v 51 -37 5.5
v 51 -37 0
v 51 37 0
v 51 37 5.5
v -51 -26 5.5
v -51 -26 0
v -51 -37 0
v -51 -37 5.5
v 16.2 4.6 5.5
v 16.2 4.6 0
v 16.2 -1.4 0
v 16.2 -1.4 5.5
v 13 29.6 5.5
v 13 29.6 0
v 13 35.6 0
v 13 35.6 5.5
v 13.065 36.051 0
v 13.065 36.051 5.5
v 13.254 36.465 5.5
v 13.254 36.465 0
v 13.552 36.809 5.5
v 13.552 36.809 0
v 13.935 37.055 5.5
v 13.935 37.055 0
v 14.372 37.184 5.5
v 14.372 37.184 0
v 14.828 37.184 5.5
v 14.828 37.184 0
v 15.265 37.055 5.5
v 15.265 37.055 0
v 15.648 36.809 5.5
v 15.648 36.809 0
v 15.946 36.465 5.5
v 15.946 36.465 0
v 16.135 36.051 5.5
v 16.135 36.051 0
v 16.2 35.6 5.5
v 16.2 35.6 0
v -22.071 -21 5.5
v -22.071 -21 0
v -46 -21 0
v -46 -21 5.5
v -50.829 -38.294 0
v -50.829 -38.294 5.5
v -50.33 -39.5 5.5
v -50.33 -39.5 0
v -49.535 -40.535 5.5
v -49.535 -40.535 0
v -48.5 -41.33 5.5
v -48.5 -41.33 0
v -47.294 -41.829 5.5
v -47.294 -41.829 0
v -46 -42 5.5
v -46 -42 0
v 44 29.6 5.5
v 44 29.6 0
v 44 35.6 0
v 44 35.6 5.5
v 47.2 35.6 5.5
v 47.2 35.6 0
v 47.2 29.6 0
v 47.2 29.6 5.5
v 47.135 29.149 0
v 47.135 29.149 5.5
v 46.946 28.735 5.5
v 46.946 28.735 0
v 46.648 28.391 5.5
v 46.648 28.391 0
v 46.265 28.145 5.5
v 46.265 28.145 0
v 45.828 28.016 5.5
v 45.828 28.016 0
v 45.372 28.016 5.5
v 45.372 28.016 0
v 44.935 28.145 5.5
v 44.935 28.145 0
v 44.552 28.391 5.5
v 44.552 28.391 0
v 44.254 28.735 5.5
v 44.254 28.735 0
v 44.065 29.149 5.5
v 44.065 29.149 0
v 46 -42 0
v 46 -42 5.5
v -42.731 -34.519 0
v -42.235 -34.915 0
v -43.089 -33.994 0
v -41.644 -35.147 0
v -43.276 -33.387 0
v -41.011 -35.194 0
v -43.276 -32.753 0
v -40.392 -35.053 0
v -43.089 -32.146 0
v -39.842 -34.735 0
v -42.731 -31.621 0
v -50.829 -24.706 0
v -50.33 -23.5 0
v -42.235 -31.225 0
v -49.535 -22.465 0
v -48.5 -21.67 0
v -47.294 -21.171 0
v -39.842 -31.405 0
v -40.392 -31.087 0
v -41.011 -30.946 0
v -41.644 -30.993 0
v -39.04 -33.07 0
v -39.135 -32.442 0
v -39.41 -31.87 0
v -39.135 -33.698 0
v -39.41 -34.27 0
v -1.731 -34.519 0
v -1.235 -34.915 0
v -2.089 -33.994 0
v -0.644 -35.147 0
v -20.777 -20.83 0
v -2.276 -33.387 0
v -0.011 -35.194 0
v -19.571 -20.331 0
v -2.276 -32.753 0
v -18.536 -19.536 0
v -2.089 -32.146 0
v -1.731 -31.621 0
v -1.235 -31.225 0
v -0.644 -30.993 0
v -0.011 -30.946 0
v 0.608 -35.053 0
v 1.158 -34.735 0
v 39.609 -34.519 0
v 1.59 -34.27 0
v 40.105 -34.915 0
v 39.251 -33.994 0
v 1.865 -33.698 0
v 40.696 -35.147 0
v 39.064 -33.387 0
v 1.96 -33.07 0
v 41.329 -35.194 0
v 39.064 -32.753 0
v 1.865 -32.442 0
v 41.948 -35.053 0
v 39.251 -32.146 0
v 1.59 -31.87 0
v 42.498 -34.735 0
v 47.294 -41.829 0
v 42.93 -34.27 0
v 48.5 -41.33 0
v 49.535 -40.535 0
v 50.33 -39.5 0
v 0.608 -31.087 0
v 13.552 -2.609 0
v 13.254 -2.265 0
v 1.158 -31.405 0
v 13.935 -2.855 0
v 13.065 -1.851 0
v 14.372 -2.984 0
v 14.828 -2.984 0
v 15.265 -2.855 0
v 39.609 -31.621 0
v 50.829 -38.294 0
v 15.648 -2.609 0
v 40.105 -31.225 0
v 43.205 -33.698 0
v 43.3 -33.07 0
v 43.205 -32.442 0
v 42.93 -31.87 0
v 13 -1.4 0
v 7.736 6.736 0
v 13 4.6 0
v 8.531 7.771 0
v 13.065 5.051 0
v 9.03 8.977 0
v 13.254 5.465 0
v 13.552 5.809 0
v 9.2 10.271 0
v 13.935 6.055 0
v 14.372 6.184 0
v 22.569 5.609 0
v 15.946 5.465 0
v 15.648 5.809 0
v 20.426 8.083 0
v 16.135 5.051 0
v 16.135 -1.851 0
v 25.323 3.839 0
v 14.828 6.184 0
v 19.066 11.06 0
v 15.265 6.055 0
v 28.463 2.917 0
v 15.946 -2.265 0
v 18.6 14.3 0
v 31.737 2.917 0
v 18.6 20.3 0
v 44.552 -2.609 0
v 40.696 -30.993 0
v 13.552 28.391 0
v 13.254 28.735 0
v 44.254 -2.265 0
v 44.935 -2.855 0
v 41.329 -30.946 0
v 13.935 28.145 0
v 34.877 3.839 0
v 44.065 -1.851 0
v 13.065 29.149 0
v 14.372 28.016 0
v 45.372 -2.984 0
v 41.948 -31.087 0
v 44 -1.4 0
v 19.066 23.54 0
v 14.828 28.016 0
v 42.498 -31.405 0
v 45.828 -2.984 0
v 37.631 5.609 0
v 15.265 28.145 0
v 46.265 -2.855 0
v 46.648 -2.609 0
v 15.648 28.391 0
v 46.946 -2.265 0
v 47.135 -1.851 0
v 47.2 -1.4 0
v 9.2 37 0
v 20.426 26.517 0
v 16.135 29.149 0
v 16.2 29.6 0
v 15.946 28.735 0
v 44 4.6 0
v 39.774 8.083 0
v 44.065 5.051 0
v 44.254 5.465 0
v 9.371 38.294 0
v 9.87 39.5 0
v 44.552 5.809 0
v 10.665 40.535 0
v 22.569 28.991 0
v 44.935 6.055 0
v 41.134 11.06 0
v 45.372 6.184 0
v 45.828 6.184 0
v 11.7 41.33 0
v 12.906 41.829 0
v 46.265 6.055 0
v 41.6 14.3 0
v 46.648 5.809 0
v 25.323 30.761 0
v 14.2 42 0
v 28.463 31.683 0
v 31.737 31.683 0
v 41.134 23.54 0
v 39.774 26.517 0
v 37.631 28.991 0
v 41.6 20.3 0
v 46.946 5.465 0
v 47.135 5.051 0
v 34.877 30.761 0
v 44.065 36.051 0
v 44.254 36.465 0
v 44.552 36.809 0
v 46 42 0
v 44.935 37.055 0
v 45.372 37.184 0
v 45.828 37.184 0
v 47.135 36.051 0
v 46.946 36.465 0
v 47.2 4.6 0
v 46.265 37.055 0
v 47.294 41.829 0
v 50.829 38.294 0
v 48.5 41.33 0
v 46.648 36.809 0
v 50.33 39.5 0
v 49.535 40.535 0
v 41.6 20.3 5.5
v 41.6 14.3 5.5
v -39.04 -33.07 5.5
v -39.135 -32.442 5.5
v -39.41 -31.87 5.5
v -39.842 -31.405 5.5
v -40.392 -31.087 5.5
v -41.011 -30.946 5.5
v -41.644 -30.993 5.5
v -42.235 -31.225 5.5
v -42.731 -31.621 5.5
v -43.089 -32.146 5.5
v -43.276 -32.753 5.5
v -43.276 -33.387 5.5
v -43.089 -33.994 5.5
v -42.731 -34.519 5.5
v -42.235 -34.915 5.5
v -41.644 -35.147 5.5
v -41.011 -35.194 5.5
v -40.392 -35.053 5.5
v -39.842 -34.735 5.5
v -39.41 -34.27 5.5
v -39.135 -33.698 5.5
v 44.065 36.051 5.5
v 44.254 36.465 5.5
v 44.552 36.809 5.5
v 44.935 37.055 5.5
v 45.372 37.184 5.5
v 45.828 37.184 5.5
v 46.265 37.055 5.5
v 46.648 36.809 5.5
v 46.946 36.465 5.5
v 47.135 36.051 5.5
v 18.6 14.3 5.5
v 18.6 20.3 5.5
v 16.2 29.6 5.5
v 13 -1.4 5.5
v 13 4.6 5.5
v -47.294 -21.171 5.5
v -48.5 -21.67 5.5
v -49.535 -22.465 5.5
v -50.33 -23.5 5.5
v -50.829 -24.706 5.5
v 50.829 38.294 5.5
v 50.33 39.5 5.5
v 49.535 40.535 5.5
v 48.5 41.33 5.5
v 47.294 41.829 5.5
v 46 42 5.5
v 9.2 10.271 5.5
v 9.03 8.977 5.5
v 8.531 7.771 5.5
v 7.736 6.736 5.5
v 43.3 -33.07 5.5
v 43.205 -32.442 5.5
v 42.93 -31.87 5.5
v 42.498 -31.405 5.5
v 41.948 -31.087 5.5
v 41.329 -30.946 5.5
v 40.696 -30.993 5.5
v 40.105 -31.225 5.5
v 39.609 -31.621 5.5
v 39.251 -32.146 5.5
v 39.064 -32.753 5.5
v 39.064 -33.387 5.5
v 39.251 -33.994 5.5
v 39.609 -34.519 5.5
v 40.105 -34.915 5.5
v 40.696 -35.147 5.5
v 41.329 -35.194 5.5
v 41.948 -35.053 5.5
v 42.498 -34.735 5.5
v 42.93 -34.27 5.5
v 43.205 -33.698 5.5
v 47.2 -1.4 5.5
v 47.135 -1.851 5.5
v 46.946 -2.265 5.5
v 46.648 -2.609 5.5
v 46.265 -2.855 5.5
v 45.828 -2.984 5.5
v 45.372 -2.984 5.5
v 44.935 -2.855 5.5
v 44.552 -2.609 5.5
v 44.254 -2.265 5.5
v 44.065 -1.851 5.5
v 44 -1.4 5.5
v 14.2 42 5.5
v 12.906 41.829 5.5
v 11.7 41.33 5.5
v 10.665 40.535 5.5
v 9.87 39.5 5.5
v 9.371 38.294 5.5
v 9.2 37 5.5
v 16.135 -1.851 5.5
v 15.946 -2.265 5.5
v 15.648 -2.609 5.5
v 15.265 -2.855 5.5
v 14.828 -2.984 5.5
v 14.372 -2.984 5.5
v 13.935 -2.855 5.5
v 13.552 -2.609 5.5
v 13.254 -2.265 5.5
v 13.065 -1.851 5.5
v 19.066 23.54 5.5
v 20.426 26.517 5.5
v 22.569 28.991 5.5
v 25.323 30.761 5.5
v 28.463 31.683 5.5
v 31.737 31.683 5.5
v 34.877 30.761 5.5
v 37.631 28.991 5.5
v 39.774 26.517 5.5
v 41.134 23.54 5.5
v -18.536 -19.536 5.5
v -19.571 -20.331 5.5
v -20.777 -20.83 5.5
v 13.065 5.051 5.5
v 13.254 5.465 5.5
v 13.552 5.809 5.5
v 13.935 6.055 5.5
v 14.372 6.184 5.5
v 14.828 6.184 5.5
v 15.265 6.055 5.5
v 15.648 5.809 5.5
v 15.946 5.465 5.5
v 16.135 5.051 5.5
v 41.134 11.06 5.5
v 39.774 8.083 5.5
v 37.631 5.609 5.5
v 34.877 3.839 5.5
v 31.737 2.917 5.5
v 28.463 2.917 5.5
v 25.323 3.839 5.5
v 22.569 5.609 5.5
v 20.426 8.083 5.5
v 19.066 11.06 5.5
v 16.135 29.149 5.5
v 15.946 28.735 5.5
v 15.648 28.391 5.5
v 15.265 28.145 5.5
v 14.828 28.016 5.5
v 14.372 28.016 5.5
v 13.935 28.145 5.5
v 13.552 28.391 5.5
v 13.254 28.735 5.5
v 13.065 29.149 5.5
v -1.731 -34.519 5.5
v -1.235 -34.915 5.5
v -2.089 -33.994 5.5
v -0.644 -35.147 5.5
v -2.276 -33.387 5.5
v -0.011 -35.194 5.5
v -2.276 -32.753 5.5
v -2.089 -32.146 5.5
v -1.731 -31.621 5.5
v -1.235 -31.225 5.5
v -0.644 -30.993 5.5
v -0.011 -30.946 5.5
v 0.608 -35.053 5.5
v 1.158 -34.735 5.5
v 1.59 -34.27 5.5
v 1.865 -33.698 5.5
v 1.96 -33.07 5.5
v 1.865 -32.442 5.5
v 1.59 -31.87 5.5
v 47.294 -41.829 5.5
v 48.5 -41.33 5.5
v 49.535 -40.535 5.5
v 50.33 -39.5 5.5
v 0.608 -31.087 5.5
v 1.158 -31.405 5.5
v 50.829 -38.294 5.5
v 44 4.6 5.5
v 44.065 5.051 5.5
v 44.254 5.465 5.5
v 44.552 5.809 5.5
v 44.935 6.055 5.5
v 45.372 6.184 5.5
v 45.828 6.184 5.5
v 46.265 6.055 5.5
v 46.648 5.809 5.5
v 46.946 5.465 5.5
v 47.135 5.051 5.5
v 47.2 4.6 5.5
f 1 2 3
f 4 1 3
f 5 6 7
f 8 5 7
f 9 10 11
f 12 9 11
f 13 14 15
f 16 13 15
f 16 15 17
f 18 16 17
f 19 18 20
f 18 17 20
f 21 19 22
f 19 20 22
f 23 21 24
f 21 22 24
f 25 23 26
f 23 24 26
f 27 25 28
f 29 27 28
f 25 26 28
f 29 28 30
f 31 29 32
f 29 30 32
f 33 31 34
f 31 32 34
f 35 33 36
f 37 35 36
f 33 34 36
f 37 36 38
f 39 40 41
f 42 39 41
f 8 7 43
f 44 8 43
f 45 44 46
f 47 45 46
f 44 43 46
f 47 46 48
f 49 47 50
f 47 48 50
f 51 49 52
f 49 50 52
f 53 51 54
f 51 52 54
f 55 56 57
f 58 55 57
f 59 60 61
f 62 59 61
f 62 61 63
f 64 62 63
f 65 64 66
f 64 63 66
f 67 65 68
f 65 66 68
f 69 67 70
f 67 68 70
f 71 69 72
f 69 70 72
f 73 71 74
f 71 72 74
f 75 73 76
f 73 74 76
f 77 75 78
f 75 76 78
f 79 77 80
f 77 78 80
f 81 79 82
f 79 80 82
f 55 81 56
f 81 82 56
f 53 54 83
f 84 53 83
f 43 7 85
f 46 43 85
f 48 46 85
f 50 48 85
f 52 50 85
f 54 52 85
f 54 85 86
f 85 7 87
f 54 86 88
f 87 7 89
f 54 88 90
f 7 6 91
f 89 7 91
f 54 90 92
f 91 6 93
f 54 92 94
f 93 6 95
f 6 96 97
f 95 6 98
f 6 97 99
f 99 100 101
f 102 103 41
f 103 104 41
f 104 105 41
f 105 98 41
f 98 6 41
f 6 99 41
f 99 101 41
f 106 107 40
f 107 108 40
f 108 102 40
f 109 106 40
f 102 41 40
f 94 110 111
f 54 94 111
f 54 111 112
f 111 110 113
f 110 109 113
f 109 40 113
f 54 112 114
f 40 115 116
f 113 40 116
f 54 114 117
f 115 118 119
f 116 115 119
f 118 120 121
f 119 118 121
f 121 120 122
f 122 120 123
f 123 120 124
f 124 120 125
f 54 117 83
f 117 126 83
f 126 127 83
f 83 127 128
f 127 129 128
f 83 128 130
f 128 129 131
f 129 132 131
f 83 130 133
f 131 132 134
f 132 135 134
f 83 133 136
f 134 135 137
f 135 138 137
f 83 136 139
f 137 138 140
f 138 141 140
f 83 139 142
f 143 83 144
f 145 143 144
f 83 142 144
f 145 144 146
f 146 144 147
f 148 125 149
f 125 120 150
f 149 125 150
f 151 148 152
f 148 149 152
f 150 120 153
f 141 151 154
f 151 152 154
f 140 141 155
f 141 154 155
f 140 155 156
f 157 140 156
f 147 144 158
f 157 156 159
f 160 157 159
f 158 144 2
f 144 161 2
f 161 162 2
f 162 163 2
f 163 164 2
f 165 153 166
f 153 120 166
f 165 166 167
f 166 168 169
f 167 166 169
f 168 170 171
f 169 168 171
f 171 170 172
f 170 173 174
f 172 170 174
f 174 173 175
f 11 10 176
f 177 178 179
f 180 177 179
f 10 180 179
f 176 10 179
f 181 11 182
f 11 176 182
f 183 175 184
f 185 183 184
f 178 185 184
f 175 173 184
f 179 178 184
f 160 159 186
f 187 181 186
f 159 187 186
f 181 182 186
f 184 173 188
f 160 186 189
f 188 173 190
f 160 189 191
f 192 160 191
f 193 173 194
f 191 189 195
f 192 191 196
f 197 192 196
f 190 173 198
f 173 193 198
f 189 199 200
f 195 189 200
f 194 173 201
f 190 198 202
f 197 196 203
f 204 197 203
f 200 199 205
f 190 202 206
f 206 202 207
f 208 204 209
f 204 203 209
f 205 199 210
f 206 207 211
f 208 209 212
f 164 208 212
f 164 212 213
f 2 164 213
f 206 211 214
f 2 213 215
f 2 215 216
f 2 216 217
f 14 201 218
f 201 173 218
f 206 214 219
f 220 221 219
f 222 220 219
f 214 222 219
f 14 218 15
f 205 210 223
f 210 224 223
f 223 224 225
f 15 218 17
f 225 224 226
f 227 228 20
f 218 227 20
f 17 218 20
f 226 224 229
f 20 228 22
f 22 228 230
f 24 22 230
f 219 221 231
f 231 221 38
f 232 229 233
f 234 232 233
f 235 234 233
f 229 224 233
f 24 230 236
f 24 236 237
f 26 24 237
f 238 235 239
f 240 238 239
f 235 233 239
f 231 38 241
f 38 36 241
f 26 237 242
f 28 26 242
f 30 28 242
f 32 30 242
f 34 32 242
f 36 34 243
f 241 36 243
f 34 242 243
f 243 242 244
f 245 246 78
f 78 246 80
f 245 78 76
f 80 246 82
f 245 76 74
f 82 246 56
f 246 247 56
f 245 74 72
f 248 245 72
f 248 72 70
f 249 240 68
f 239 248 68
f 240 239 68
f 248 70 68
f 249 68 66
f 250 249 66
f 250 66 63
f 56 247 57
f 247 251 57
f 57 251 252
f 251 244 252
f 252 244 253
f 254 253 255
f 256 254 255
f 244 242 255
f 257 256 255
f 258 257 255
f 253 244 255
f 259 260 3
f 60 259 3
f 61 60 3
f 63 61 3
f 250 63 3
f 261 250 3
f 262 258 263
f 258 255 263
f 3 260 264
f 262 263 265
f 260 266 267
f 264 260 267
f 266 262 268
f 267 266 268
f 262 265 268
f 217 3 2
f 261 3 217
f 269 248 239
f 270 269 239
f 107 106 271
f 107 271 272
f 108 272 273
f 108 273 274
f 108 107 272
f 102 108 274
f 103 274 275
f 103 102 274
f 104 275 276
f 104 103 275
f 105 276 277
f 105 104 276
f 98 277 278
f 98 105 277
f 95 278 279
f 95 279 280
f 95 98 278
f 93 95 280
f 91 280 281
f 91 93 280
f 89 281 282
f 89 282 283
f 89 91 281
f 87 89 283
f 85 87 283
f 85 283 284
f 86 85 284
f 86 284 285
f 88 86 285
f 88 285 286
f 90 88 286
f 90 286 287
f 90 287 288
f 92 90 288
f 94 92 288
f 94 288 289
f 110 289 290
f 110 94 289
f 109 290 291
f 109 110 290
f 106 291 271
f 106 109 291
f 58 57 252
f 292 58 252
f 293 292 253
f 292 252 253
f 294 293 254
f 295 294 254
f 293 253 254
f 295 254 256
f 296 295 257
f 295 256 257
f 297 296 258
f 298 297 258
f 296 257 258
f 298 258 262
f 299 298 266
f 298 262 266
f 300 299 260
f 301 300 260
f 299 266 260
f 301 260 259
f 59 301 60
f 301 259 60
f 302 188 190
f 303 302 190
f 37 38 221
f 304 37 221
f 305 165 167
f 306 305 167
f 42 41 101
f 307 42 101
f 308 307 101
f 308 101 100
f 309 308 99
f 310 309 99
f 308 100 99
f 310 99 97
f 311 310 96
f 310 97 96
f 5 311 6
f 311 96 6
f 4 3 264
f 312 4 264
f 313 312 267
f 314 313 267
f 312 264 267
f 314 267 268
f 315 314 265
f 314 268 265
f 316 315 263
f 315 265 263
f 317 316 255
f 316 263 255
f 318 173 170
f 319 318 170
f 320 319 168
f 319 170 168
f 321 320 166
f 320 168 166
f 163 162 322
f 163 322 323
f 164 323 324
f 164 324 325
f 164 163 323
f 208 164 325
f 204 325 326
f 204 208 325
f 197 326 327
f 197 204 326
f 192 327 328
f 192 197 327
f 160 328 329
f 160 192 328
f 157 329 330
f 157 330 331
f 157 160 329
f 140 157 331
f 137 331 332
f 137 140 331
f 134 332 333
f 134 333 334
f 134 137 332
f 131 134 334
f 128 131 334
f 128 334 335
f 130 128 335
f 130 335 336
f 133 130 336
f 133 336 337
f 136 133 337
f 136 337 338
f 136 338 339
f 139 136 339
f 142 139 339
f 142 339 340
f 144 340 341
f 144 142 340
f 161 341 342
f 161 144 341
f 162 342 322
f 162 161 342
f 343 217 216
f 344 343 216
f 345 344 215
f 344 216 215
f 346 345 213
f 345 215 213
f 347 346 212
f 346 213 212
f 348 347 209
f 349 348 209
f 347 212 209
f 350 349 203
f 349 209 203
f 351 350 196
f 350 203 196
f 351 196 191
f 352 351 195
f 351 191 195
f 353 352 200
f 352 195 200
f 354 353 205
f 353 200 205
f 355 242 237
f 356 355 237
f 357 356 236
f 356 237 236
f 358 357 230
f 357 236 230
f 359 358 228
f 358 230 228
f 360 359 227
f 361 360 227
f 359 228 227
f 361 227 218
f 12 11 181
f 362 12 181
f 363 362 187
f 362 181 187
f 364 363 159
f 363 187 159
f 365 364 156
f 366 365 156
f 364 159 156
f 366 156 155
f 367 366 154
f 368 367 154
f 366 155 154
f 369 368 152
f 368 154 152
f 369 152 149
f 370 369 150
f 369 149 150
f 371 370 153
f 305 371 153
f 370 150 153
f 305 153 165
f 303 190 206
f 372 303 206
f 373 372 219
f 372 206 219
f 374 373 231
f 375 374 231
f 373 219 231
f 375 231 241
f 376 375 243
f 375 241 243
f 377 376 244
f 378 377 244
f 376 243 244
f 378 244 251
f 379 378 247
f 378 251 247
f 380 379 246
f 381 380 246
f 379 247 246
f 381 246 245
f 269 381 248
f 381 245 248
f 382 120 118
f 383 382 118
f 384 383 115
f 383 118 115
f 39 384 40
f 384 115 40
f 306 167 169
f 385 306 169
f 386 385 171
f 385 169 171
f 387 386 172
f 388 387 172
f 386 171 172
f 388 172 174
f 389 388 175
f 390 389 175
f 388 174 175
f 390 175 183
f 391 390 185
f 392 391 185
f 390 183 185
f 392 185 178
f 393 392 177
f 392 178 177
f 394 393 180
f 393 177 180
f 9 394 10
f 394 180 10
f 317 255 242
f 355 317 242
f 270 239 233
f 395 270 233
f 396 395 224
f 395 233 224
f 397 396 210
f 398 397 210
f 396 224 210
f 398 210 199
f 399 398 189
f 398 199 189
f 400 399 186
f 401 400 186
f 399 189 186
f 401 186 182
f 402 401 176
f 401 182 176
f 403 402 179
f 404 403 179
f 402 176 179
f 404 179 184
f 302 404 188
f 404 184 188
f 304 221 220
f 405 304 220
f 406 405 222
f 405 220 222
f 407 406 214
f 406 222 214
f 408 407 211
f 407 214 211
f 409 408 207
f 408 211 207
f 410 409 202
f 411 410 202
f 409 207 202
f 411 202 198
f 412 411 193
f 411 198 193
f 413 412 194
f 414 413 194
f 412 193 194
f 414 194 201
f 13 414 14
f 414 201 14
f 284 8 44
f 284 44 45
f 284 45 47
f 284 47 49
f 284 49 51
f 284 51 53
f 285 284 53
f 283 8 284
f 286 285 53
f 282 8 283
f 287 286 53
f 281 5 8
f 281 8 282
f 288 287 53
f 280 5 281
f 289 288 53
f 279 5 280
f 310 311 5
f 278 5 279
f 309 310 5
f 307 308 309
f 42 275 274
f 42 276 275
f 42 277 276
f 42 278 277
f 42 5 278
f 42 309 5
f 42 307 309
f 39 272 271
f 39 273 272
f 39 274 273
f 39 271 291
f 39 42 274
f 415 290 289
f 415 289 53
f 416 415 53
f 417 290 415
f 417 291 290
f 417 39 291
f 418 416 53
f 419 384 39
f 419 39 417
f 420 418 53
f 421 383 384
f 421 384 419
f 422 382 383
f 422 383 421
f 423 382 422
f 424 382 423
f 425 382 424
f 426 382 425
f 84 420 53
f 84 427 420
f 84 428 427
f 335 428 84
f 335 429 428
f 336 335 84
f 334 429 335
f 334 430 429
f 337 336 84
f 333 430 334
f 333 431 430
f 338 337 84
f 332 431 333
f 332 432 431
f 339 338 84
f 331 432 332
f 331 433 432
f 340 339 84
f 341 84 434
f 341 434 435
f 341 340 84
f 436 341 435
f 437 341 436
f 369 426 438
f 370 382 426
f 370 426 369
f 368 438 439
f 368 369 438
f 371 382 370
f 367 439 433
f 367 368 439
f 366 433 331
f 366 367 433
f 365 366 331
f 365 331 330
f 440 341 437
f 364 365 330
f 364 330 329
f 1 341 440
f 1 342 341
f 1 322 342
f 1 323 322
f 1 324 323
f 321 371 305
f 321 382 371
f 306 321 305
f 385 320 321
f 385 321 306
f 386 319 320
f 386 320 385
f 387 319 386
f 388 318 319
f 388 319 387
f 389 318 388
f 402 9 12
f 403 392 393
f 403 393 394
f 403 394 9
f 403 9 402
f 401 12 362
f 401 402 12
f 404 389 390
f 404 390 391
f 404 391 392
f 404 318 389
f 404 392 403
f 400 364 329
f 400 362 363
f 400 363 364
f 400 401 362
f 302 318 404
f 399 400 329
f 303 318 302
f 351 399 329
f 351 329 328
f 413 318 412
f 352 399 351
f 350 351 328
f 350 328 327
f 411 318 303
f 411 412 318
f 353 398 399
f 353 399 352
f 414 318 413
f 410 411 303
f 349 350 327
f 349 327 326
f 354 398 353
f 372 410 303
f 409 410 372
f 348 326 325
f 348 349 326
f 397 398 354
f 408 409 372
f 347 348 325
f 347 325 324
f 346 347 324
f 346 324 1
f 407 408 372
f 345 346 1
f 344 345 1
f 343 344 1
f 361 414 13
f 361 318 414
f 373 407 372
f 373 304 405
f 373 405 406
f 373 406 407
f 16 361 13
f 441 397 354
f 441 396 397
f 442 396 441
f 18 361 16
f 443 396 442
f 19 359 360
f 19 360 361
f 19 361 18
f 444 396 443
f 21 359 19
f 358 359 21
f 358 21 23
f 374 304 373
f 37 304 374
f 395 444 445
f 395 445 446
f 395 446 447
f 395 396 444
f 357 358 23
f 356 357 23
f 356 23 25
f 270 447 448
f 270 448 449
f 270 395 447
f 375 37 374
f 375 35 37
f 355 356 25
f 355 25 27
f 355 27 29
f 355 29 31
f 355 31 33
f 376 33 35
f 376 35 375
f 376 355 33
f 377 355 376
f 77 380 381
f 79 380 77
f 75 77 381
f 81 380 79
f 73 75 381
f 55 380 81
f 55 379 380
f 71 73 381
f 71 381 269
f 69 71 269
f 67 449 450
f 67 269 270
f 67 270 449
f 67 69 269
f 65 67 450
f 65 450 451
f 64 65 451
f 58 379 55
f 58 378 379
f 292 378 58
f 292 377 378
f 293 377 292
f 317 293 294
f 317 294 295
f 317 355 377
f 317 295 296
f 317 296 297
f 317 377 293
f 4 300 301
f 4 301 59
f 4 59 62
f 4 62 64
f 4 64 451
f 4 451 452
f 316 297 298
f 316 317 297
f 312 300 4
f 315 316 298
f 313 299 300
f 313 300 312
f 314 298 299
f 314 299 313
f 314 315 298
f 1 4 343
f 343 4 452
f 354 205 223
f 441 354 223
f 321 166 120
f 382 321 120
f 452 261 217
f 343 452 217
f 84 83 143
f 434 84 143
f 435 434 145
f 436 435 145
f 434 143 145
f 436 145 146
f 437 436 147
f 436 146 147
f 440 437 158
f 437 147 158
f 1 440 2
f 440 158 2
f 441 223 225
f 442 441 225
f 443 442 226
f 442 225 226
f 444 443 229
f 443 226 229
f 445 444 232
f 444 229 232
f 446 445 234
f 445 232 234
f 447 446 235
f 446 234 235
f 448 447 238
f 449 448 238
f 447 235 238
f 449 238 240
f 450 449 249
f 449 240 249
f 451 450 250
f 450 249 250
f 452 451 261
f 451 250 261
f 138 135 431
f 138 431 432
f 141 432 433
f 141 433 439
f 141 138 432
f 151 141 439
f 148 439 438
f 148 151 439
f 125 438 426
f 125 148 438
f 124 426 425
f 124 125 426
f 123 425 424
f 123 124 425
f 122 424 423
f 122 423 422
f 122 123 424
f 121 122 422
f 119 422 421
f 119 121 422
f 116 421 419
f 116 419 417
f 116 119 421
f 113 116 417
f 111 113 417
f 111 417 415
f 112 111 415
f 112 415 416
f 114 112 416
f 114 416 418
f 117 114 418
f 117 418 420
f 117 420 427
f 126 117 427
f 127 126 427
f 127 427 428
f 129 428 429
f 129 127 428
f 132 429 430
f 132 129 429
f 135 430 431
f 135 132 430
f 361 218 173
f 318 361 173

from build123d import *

# Parameters (mm, degrees)
F0_R     = 2.13
F1_DEPTH = 5.5


# Not quite as in the source:
# - ends of sketch curves that miss each other by under 0.0002 mm in the source are joined


with BuildPart() as f1:
    # F0 (on Top) → F1 (new body)
    with BuildSketch(Plane.XY):
        with BuildLine():
            ThreePointArc((9.1999998704, 10.271), (8.8197324019, 8.3578320272), (7.735999997, 6.736000003))
            Line((7.735999997, 6.736000003), (-18.536, -19.536))
            ThreePointArc((-18.536, -19.536), (-20.1578320272, -20.6197324019), (-22.071, -20.9999998704))
            Line((-22.071, -20.9999998704), (-46, -21))
            ThreePointArc((-46, -21), (-49.5349996687, -22.4650003313), (-50.9999996674, -26.0000000001))
            Line((-50.9999996674, -26.0000000001), (-51, -37))
            ThreePointArc((-51, -37), (-49.5349996687, -40.5349996687), (-45.9999999999, -41.9999996674))
            Line((-45.9999999999, -41.9999996674), (46, -42))
            ThreePointArc((46, -42), (49.5349996687, -40.5349996687), (50.9999996674, -36.9999999999))
            Line((50.9999996674, -36.9999999999), (51, 37))
            ThreePointArc((51, 37), (49.5349996687, 40.5349996687), (45.9999999999, 41.9999996674))
            Line((45.9999999999, 41.9999996674), (14.2, 42))
            ThreePointArc((14.2, 42), (10.6650003313, 40.5349996687), (9.2000003326, 36.9999999999))
            Line((9.2000003326, 36.9999999999), (9.1999998704, 10.271))
        make_face()
        with Locations((-41.17, -33.07)):
            Circle(F0_R, mode=Mode.SUBTRACT)
        with Locations((-0.17, -33.07)):
            Circle(F0_R, mode=Mode.SUBTRACT)
        with Locations((41.17, -33.07)):
            Circle(F0_R, mode=Mode.SUBTRACT)
        with BuildLine():
            ThreePointArc((13, 4.6), (14.6, 6.2), (16.2, 4.6))
            Line((16.2, 4.6), (16.2, -1.4))
            ThreePointArc((16.2, -1.4), (14.6, -3), (13, -1.4))
            Line((13, -1.4), (13, 4.6))
        make_face(mode=Mode.SUBTRACT)
        with BuildLine():
            Line((47.2, 4.6), (47.2, -1.4))
            ThreePointArc((47.2, -1.4), (45.6, -3), (44, -1.4))
            Line((44, -1.4), (44, 4.6))
            ThreePointArc((44, 4.6), (45.6, 6.2), (47.2, 4.6))
        make_face(mode=Mode.SUBTRACT)
        with BuildLine():
            ThreePointArc((41.6, 14.3), (30.1, 2.8), (18.6, 14.3))
            Line((18.6, 14.3), (18.6, 20.3))
            ThreePointArc((18.6, 20.3), (30.1, 31.8), (41.6, 20.3))
            Line((41.6, 20.3), (41.6, 14.3))
        make_face(mode=Mode.SUBTRACT)
        with BuildLine():
            ThreePointArc((13, 35.6), (14.6, 37.2), (16.2, 35.6))
            Line((16.2, 35.6), (16.2, 29.6))
            ThreePointArc((16.2, 29.6), (14.6, 28), (13, 29.6))
            Line((13, 29.6), (13, 35.6))
        make_face(mode=Mode.SUBTRACT)
        with BuildLine():
            Line((47.2, 35.6), (47.2, 29.6))
            ThreePointArc((47.2, 29.6), (45.6, 28), (44, 29.6))
            Line((44, 29.6), (44, 35.6))
            ThreePointArc((44, 35.6), (45.6, 37.2), (47.2, 35.6))
        make_face(mode=Mode.SUBTRACT)
    extrude(amount=F1_DEPTH)


solid = f1.part
